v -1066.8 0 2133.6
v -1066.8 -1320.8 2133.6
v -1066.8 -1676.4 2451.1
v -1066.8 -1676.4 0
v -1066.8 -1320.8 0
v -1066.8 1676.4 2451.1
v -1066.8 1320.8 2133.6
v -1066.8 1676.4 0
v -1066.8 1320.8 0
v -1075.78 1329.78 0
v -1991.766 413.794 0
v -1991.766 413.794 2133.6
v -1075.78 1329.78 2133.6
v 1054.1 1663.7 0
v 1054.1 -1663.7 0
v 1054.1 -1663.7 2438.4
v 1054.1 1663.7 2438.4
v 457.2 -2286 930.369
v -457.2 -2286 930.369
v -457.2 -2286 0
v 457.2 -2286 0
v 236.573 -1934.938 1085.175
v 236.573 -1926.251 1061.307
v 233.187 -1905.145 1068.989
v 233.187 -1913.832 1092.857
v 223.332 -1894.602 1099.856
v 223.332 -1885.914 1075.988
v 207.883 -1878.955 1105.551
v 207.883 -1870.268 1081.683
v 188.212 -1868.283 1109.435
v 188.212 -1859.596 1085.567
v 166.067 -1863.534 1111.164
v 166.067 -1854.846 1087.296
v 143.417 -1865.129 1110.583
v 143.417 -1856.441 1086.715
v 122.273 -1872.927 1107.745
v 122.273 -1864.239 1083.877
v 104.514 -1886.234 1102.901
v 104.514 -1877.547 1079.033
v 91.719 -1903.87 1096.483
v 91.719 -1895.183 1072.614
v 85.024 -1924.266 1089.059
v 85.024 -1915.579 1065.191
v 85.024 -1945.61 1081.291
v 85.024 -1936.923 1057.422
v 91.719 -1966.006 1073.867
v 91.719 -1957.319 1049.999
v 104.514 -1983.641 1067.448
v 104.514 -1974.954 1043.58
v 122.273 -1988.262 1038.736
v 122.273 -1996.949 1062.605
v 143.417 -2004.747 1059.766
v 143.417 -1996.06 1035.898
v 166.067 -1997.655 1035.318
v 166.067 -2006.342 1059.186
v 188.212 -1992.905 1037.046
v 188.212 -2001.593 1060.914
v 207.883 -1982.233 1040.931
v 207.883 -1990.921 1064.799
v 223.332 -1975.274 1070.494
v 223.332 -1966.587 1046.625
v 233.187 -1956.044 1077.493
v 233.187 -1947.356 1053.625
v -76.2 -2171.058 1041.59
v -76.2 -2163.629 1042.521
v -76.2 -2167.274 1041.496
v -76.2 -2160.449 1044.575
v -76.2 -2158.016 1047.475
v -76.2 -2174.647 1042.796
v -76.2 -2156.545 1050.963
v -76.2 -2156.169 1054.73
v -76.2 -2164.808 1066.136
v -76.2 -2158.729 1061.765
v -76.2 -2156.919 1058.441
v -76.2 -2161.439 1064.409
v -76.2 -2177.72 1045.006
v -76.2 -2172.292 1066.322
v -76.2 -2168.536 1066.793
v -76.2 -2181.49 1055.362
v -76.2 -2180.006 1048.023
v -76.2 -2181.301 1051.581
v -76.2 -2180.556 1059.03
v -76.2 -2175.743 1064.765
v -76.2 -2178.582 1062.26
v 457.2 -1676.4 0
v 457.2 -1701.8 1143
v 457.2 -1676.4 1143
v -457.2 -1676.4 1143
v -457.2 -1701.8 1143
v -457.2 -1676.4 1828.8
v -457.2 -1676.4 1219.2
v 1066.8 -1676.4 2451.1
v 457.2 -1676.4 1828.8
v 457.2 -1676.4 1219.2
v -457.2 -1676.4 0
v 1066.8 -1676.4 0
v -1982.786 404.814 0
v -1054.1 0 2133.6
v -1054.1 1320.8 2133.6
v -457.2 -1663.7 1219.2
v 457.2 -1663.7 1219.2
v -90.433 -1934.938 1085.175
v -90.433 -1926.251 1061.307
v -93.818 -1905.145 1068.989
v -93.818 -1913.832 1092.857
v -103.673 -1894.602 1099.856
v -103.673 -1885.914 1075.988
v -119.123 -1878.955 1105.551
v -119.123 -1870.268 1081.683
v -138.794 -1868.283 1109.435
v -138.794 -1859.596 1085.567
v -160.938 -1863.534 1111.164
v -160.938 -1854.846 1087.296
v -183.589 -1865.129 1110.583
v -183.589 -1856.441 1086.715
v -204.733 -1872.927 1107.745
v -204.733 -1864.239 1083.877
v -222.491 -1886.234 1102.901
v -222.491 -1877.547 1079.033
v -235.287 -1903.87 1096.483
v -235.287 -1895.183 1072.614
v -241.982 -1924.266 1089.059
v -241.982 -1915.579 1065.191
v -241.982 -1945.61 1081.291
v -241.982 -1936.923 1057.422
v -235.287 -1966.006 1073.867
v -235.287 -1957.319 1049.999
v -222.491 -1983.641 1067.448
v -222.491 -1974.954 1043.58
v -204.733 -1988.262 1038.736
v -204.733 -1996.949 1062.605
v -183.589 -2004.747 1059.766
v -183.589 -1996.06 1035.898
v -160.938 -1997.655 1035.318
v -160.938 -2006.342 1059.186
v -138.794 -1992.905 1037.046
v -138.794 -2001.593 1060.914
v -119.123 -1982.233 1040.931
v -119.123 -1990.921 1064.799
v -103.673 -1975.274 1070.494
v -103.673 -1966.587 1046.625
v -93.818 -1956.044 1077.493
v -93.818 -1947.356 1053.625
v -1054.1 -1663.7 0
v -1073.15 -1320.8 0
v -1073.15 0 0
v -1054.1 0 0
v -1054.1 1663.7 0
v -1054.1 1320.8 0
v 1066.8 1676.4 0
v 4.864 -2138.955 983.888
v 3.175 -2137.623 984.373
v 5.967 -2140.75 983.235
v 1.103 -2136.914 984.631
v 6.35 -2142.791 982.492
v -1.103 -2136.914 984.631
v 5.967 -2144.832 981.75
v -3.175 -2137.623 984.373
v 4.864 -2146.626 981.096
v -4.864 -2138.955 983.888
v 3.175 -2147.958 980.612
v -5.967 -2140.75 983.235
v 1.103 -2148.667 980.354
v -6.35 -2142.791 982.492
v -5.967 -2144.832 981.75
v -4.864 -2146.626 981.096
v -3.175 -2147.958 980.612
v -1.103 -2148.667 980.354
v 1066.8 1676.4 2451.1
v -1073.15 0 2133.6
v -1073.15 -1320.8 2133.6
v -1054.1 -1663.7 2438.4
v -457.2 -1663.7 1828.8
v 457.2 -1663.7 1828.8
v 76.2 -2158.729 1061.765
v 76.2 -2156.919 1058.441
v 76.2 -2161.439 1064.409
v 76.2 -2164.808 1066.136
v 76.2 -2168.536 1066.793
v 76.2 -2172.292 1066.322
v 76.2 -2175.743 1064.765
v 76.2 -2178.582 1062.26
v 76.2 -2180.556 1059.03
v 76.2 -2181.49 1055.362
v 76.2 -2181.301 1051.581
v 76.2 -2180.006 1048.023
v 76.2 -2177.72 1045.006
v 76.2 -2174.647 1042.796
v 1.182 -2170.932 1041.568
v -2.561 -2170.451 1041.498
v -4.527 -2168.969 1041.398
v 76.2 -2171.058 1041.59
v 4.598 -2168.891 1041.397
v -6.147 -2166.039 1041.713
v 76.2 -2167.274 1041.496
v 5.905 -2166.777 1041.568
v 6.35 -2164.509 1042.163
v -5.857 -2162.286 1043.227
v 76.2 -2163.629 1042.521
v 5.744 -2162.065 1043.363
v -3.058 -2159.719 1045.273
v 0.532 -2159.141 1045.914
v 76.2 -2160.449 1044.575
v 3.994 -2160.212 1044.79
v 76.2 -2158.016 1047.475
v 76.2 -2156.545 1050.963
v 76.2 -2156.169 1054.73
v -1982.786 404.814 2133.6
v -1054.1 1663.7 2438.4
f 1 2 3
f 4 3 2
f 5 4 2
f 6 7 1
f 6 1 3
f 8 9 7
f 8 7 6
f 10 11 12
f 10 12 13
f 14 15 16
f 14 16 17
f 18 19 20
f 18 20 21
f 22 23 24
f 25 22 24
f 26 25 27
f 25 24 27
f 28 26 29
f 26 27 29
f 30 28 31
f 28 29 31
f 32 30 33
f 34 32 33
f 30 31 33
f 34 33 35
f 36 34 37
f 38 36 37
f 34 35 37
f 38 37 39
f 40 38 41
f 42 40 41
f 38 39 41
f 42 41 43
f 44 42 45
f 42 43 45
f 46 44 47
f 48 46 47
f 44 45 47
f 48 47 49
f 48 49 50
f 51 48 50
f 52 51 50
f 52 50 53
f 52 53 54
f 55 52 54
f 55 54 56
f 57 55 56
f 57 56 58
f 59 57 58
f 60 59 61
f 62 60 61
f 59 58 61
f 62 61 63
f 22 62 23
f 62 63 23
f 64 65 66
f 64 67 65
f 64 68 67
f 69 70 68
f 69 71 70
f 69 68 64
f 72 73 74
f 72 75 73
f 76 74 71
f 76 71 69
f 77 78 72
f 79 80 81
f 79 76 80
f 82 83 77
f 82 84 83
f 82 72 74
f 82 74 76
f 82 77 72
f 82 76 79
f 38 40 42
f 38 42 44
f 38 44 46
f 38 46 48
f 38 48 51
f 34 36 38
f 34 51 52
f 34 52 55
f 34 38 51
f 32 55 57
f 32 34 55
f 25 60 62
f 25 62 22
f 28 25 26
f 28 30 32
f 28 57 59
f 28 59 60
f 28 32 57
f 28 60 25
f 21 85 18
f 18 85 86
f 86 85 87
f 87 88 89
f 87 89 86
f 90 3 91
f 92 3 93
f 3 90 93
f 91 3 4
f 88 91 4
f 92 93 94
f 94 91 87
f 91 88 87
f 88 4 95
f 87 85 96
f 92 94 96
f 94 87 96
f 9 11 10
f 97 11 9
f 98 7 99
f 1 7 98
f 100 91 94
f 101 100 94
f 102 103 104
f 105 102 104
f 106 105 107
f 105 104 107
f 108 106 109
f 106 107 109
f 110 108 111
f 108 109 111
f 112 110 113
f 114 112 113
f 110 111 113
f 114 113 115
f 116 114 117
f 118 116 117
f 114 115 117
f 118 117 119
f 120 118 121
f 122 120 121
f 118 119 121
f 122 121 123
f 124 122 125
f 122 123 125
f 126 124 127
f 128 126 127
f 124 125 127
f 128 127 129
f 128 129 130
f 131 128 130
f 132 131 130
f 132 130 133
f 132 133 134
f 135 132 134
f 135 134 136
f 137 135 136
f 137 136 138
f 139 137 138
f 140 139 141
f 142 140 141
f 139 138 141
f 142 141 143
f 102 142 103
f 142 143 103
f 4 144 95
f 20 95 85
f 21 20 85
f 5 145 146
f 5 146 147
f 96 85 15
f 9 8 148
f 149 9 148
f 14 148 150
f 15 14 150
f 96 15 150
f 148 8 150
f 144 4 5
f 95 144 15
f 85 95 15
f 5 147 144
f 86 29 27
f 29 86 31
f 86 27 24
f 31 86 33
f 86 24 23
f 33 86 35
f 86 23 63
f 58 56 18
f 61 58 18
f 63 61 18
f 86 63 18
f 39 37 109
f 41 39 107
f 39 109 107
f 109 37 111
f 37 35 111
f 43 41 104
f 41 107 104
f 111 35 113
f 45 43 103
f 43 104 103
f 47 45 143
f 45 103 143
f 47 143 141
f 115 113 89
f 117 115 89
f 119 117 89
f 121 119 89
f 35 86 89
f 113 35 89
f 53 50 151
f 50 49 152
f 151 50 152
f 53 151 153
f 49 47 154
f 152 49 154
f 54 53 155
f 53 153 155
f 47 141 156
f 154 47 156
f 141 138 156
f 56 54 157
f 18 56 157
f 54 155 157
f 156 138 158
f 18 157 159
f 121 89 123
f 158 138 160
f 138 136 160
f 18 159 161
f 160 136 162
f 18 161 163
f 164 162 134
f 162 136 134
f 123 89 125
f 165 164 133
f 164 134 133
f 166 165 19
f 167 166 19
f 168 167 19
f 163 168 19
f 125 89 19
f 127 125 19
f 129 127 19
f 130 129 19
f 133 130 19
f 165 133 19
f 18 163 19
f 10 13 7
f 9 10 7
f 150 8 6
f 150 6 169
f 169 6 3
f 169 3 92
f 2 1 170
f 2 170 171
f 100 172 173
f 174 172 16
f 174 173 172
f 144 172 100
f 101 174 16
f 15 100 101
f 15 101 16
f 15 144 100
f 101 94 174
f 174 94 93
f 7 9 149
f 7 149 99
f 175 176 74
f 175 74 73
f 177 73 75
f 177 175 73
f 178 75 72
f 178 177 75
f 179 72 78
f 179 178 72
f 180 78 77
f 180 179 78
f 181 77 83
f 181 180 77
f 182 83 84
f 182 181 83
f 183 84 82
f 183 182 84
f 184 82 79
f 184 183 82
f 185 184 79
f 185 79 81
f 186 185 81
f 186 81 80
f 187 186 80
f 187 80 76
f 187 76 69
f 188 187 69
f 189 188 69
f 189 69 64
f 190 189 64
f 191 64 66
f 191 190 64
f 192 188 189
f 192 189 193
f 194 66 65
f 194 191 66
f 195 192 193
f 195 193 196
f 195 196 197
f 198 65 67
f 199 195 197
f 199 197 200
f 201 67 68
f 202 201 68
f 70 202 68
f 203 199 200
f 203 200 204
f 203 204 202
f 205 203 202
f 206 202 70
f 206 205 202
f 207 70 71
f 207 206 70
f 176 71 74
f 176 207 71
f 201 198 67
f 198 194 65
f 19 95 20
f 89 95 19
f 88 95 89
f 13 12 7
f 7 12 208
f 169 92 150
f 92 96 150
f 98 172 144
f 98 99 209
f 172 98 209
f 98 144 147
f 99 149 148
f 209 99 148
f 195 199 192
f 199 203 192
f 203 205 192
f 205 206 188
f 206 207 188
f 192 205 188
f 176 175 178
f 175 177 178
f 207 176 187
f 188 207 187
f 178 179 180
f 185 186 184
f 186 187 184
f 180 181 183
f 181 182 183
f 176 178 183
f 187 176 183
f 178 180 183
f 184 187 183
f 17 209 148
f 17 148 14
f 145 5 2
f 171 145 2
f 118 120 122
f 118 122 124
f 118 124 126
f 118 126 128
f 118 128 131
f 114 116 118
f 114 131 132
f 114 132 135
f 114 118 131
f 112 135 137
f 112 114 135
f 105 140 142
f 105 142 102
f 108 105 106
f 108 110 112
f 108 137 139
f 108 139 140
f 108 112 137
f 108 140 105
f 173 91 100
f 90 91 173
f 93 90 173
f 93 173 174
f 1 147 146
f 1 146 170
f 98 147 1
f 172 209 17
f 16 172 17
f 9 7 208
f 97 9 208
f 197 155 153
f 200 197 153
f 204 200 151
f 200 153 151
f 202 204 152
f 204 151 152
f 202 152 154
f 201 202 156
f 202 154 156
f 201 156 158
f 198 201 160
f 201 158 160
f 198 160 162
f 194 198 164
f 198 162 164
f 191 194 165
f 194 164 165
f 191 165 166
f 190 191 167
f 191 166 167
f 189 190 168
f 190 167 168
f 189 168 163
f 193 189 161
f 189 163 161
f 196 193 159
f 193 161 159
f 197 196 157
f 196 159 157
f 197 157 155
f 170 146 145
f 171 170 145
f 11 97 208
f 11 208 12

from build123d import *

# Parameters (mm, degrees)
F0_W      = 2133.6
F0_H      = 3352.8
F0_W_2    = 2108.2
F0_H_2    = 3327.4
F1_DEPTH  = 2438.4
F2_W      = 1320.8
F2_H      = 2133.6
F3_DEPTH  = 6.35
F4_W      = 1320.8
F4_H      = 2133.6
F5_DEPTH  = 25.4
F7_DEPTH  = 2133.6
F8_W      = 914.4
F8_H      = 609.6
F9_DEPTH  = 25.4
F10_W     = 914.4
F10_H     = 1143
F11_DEPTH = 609.6
F13_DEPTH = 1524.001
F14_R     = 76.2
F15_DEPTH = 25.4
F16_R     = 6.35
F17_DEPTH = 76.2
F18_W     = 152.4
F18_H     = 12.7
F20_W     = 2133.6
F20_H     = 3352.8
F21_DEPTH = 12.7


with BuildPart() as f1:
    # F0 (on Top) → F1 (new body)
    with BuildSketch(Plane.XY):
        Rectangle(F0_W, F0_H)
        Rectangle(F0_W_2, F0_H_2, mode=Mode.SUBTRACT)
    extrude(amount=F1_DEPTH)

    # F2 (on face) → F3 (join)
    with BuildSketch(Plane(origin=(-1066.8, 0, 0), x_dir=(0, -1, 0), z_dir=(-1, 0, 0))):
        with Locations((660.4, 1066.8)):
            Rectangle(F2_W, F2_H)
    extrude(amount=F3_DEPTH)

    # F4 (on face) → F5 (cut)
    with BuildSketch(Plane(origin=(-1066.8, 0, 0), x_dir=(0, -1, 0), z_dir=(-1, 0, 0))):
        with Locations((-660.4, 1066.8)):
            Rectangle(F4_W, F4_H)
    extrude(amount=-F5_DEPTH, mode=Mode.SUBTRACT)

    # F8 (on face) → F9 (cut)
    with BuildSketch(Plane.XZ.offset(1676.4)):
        with Locations((0, 1524)):
            Rectangle(F8_W, F8_H)
    extrude(amount=-F9_DEPTH, mode=Mode.SUBTRACT)

    # F10 (on face) → F11 (join)
    with BuildSketch(Plane.XZ.offset(1676.4)):
        with Locations((0, 571.5)):
            Rectangle(F10_W, F10_H)
    extrude(amount=F11_DEPTH)

    # F12 (on face) → F13 (cut, through all)
    with BuildSketch(Plane(origin=(-457.2, 0, 0), x_dir=(0, -1, 0), z_dir=(-1, 0, 0))):
        Polygon((2286, 1143), (1701.8, 1143), (2286, 930.3685891417), align=None)
    extrude(amount=-F13_DEPTH, mode=Mode.SUBTRACT)

    # F14 (on face) → F15 (join)
    with BuildSketch(Plane(origin=(0, -566.4259022859, 1556.2423763248), x_dir=(1, 0, 0), z_dir=(0, -0.3420201433, 0.9396926208))):
        with Locations((160.3726652645, -1447.0952749252)):
            Circle(F14_R)
        with Locations((-166.6327175879, -1447.0952749252)):
            Circle(F14_R)
    extrude(amount=F15_DEPTH)

    # F16 (on face) → F17 (join)
    with BuildSketch(Plane(origin=(0, -566.4259022859, 1556.2423763248), x_dir=(1, 0, 0), z_dir=(0, -0.3420201433, 0.9396926208))):
        with Locations((0, -1677.5325329126)):
            Circle(F16_R)
    extrude(amount=F17_DEPTH)

    # F18 (on face) → F19 (revolve)
    with BuildSketch(Plane(origin=(0, -592.4878372073, 1627.8469540287), x_dir=(1, 0, 0), z_dir=(0, -0.3420201433, 0.9396926208))):
        with Locations((0, -1671.1825329126)):
            Rectangle(F18_W, F18_H)
    revolve(axis=Axis((0, -2168.8527795136, 1054.0970366884), (1, 0, 0)))

    # F20 (on face) → F21 (join)
    with BuildSketch(Plane.XY.offset(2438.4)):
        Rectangle(F20_W, F20_H)
    extrude(amount=F21_DEPTH)


with BuildPart() as f7:
    # F6 (on face) → F7 (new body)
    with BuildSketch(Plane(origin=(0, 0, 2133.6), x_dir=(1, 0, 0), z_dir=(0, 0, -1))):
        Polygon((-1075.7802561211, -1329.7802561211), (-1066.8, -1320.8), (-1982.7861243491, -404.8138756509), (-1991.7663804701, -413.794131772), align=None)
    extrude(amount=F7_DEPTH)


solid = Compound([f1.part, f7.part])
